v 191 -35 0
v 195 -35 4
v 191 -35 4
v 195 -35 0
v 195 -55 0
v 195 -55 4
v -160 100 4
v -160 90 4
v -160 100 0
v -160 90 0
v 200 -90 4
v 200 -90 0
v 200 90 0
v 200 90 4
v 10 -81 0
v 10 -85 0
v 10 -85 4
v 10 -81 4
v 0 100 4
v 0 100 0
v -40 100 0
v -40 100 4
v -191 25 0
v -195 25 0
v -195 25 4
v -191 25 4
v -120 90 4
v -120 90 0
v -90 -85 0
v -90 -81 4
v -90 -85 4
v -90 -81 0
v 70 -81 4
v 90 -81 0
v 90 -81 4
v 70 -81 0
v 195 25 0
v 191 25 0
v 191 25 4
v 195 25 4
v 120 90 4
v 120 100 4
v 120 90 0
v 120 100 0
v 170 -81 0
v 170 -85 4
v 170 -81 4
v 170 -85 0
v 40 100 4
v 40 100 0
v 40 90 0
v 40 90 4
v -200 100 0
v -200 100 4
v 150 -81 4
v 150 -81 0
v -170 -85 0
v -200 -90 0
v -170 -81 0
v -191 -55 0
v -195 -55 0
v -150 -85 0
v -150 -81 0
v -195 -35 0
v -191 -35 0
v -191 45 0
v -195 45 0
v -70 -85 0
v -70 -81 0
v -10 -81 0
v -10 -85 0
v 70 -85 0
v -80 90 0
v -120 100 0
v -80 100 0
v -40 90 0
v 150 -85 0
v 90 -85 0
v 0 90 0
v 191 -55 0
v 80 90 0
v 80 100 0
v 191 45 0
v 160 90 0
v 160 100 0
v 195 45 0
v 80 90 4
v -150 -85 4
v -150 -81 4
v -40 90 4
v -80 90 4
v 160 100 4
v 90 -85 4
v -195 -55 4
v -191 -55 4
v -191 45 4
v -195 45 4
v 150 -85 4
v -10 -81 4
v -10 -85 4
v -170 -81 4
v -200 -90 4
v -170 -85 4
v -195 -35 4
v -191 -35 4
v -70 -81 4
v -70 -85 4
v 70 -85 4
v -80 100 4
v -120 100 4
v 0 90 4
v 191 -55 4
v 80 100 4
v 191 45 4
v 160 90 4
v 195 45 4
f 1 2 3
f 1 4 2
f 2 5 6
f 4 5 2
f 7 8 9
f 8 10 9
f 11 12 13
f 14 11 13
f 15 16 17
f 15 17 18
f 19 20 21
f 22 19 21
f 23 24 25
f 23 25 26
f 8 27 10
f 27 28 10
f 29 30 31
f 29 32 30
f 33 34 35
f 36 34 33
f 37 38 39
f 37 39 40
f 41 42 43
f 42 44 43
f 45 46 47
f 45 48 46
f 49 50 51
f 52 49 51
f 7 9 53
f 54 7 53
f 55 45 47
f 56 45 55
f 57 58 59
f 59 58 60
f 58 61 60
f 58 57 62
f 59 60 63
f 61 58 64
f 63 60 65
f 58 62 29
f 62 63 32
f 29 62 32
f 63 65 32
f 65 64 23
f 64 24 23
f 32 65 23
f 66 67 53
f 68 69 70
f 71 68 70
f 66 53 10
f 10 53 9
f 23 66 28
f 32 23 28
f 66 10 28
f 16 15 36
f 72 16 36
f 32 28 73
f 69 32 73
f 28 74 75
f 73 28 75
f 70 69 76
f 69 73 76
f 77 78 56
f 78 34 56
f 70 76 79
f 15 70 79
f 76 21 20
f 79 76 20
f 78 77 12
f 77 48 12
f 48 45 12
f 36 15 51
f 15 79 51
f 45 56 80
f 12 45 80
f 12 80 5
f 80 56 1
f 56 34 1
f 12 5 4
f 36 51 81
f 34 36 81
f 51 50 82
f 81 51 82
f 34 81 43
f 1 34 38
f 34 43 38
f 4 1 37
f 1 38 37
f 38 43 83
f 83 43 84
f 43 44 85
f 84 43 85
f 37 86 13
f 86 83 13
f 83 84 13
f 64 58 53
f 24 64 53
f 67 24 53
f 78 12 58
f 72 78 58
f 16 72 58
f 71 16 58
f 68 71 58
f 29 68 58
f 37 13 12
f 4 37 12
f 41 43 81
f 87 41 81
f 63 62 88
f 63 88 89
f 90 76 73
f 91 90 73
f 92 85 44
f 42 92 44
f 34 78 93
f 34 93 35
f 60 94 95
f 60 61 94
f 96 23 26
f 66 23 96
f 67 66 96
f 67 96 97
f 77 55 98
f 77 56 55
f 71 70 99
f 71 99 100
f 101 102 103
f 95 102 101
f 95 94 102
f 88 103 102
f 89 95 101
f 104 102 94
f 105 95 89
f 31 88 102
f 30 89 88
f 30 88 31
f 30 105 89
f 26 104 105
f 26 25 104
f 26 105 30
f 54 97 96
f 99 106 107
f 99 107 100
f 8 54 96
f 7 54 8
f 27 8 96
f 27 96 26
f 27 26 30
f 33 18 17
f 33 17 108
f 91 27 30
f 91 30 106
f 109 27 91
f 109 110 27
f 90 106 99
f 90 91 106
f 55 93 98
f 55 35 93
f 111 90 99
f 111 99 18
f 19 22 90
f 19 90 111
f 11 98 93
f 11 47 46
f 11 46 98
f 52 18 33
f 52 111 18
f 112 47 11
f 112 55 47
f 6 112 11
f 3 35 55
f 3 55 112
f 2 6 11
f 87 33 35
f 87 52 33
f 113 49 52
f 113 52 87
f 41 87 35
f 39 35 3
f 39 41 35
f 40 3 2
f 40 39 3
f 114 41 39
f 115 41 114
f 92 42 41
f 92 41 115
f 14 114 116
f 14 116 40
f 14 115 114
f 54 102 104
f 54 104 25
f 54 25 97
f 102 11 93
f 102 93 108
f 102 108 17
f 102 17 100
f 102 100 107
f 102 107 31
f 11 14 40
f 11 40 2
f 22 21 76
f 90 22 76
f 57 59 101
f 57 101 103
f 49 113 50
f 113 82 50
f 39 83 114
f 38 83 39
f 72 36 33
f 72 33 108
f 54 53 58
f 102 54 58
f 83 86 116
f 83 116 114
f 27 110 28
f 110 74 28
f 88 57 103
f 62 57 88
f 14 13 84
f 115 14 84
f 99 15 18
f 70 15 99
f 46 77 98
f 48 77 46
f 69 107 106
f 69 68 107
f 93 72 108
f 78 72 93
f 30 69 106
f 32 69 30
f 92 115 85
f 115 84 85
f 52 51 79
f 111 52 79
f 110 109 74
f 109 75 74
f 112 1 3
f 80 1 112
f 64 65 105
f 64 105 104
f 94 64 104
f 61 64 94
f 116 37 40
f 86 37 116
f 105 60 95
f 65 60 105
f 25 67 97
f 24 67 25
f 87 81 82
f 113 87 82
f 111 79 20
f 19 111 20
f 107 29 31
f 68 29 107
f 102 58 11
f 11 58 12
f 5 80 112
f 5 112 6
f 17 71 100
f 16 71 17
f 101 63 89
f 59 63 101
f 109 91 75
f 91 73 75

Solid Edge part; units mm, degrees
sketch "Sketch1" plane through (0, 0, 0) normal (0, 0, 1) x (1, 0, 0)
  line L0 (-200, -90) -> (200, -90)
  line L1 (200, -90) -> (200, 90)
  line L2 (200, 90) -> (-200, 90)
  line L3 (-200, 90) -> (-200, -90)
  line L4 (-150, -81) -> (-170, -81)
  line L5 (-170, -81) -> (-170, -85)
  line L6 (-170, -85) -> (-150, -85)
  line L7 (-150, -85) -> (-150, -81)
  line L8 (-90, -85) -> (-70, -85)
  line L9 (-70, -85) -> (-70, -81)
  line L10 (-70, -81) -> (-90, -81)
  line L11 (-90, -81) -> (-90, -85)
  line L12 (-10, -85) -> (10, -85)
  line L13 (10, -85) -> (10, -81)
  line L14 (10, -81) -> (-10, -81)
  line L15 (-10, -81) -> (-10, -85)
  line L16 (70, -85) -> (90, -85)
  line L17 (90, -85) -> (90, -81)
  line L18 (90, -81) -> (70, -81)
  line L19 (70, -81) -> (70, -85)
  line L20 (150, -85) -> (170, -85)
  line L21 (170, -85) -> (170, -81)
  line L22 (170, -81) -> (150, -81)
  line L23 (150, -81) -> (150, -85)
  line L24 (160, 100) -> (120, 100)
  line L25 (120, 100) -> (120, 90)
  line L26 (120, 90) -> (160, 90)
  line L27 (160, 90) -> (160, 100)
  line L28 (80, 100) -> (40, 100)
  line L29 (40, 100) -> (40, 90)
  line L30 (40, 90) -> (80, 90)
  line L31 (80, 90) -> (80, 100)
  line L32 (0, 100) -> (-40, 100)
  line L33 (-40, 100) -> (-40, 90)
  line L34 (-40, 90) -> (0, 90)
  line L35 (0, 90) -> (0, 100)
  line L36 (-80, 100) -> (-120, 100)
  line L37 (-120, 100) -> (-120, 90)
  line L38 (-120, 90) -> (-80, 90)
  line L39 (-80, 90) -> (-80, 100)
  line L40 (-160, 100) -> (-200, 100)
  line L41 (-200, 100) -> (-200, 90)
  line L42 (-200, 90) -> (-160, 90)
  line L43 (-160, 90) -> (-160, 100)
  line L44 (-191, 25) -> (-191, 45)
  line L45 (-191, 45) -> (-195, 45)
  line L46 (-195, 45) -> (-195, 25)
  line L47 (-195, 25) -> (-191, 25)
  line L48 (-195, -35) -> (-195, -55)
  line L49 (-195, -55) -> (-191, -55)
  line L50 (-191, -55) -> (-191, -35)
  line L51 (-191, -35) -> (-195, -35)
  line L52 (191, -35) -> (191, -55)
  line L53 (191, -55) -> (195, -55)
  line L54 (195, -55) -> (195, -35)
  line L55 (195, -35) -> (191, -35)
  line L56 (195, 25) -> (195, 45)
  line L57 (195, 45) -> (191, 45)
  line L58 (191, 45) -> (191, 25)
  line L59 (191, 25) -> (195, 25)
  dimension "D1" = 20
  dimension "D2" = 20
  dimension "D3" = 20
  dimension "D4" = 4
  dimension "D5" = 4
  dimension "D6" = 20
  dimension "D7" = 20
  dimension "D8" = 4
  dimension "D9" = 4
  dimension "D10" = 4
  dimension "D11" = 30
  dimension "D12" = 60
  dimension "D13" = 60
  dimension "D14" = 30
  dimension "D15" = 60
  dimension "D16" = 60
  dimension "D17" = 5
  dimension "D18" = 5
  dimension "D19" = 5
  dimension "D20" = 5
  dimension "D21" = 5
  dimension "D22" = 40
  dimension "D23" = 10
  dimension "D24" = 40
  dimension "D25" = 40
  dimension "D26" = 10
  dimension "D27" = 40
  dimension "D28" = 40
  dimension "D29" = 10
  dimension "D30" = 40
  dimension "D31" = 40
  dimension "D32" = 10
  dimension "D33" = 40
  dimension "D34" = 40
  dimension "D35" = 10
  dimension "D36" = 40
  dimension "D37" = 180
  dimension "D38" = 20
  dimension "D39" = 20
  dimension "D40" = 20
  dimension "D41" = 20
  dimension "D42" = 4
  dimension "D43" = 4
  dimension "D44" = 4
  dimension "D45" = 4
  dimension "D46" = 5
  dimension "D47" = 5
  dimension "D48" = 26
  dimension "D49" = 60
  dimension "D50" = 5
  dimension "D51" = 5
  dimension "D52" = 35
  dimension "D53" = 60
  dimension "D54" = 45
extrude "Protrusion1" add sketch "Sketch1" along normal blind 4
